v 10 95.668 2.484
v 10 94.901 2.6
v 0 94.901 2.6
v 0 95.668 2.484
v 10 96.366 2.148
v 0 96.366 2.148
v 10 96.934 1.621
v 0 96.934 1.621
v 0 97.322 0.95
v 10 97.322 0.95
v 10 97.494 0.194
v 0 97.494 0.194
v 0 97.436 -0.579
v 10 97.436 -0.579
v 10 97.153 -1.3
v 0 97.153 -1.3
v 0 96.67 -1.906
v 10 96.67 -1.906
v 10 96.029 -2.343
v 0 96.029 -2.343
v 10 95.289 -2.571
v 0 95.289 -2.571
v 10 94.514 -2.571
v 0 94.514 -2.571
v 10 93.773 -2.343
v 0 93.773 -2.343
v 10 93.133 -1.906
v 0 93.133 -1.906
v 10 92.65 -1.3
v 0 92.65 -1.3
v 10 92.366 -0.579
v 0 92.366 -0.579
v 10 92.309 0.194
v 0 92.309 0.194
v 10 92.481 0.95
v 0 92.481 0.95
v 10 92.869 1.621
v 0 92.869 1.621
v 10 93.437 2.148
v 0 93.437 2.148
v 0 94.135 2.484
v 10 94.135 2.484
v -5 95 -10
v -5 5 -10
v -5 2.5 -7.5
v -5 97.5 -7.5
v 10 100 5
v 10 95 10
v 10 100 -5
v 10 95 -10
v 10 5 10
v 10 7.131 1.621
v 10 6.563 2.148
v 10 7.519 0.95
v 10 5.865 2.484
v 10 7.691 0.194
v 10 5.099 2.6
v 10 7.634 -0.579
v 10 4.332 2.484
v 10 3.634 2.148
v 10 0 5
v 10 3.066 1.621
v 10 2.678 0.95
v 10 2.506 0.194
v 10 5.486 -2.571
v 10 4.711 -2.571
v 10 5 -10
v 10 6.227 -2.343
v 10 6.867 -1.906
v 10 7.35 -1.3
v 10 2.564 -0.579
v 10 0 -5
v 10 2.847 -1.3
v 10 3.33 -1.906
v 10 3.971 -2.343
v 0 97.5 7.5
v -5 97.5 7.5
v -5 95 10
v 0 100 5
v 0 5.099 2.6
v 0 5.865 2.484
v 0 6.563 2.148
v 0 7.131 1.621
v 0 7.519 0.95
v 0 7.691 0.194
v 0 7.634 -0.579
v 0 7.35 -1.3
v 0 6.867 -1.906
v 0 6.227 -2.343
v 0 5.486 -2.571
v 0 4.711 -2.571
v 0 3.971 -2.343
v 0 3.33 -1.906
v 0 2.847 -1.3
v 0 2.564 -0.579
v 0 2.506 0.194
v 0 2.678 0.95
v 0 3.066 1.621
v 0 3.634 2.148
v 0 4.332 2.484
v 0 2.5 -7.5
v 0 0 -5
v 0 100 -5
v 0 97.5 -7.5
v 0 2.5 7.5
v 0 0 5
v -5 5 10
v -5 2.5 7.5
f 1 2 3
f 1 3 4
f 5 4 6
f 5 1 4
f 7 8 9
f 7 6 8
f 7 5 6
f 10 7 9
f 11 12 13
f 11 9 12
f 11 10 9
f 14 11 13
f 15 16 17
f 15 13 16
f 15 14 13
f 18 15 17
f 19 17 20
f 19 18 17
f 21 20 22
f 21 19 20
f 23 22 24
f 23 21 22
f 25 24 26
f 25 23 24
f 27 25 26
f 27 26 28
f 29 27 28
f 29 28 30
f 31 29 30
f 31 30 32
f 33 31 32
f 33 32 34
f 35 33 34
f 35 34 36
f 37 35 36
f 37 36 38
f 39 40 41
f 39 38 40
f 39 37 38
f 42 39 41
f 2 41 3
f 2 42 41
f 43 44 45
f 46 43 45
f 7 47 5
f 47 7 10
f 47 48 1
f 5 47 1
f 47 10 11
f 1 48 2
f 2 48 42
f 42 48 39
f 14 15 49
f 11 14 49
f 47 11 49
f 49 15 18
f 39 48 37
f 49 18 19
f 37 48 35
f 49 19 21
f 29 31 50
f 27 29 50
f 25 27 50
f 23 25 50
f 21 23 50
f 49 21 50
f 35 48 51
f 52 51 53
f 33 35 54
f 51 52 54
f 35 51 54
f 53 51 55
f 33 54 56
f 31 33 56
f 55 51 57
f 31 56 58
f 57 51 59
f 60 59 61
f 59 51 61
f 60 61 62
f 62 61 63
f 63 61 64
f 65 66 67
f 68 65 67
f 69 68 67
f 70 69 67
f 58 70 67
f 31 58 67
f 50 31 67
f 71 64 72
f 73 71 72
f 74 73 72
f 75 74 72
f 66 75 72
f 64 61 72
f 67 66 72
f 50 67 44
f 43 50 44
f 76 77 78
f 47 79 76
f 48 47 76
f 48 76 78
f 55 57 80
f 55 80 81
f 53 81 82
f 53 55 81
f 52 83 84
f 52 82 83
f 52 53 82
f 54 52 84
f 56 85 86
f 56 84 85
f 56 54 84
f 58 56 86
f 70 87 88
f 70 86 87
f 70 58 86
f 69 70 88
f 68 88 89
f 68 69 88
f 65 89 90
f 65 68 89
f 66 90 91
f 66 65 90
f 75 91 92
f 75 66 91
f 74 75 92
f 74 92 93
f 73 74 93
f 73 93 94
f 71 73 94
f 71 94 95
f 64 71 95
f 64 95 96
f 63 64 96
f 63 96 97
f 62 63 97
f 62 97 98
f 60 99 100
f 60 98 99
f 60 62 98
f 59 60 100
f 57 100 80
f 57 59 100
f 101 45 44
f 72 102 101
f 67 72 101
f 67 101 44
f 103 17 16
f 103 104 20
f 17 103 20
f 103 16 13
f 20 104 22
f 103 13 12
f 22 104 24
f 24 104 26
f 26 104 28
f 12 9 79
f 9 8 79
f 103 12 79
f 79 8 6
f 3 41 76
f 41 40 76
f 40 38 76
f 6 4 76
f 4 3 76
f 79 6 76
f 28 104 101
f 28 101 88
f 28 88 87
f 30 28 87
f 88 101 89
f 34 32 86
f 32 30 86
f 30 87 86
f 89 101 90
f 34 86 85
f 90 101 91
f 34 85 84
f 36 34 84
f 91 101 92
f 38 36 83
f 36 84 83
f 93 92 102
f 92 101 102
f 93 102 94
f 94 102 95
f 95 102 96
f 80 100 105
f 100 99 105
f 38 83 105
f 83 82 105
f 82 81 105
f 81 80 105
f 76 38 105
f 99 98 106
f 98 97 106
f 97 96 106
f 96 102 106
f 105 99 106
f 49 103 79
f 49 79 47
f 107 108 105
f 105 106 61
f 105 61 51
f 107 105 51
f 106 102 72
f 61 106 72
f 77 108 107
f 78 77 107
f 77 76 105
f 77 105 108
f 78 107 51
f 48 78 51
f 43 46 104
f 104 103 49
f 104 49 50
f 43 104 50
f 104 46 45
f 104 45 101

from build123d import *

# Parameters (mm, degrees)
EXTRUDE_1_DEPTH          = 100
CUT_EXTRUDE_1_DEPTH      = 101.995049384
CUT_EXTRUDE_1_DEPTH_BACK = 101.995049384
SKETCH_2_R               = 2.6


with BuildPart() as part:
    # 草图1 → 凸台-拉伸1 (new body)
    with BuildSketch(Plane(origin=(0, 0, 0), x_dir=(1, 0, 0), z_dir=(0, 1, 0))):
        Polygon((-5, 7.5), (0, 7.5), (0, -7.5), (-5, -7.5), (-5, -10), (10, -10), (10, 10), (-5, 10), align=None)
    extrude(amount=EXTRUDE_1_DEPTH)

    # 草图2 → 切除-拉伸1 (cut, two sides: drawn at the far end of the back side and taken through both)
    with BuildSketch(Plane.ZY.offset(-CUT_EXTRUDE_1_DEPTH_BACK)):
        with Locations((0, 94.901280605)):
            Circle(SKETCH_2_R)
        with Locations((0, 5.098719395)):
            Circle(SKETCH_2_R)
        Polygon((-5, 100), (-10, 95), (-10, 100), align=None)
        Polygon((10, 100), (5, 100), (10, 95), align=None)
        Polygon((-10, 0), (-5, 0), (-10, 5), align=None)
        Polygon((10, 5), (10, 0), (5, 0), align=None)
    extrude(amount=CUT_EXTRUDE_1_DEPTH + CUT_EXTRUDE_1_DEPTH_BACK, mode=Mode.SUBTRACT)


solid = part.part
